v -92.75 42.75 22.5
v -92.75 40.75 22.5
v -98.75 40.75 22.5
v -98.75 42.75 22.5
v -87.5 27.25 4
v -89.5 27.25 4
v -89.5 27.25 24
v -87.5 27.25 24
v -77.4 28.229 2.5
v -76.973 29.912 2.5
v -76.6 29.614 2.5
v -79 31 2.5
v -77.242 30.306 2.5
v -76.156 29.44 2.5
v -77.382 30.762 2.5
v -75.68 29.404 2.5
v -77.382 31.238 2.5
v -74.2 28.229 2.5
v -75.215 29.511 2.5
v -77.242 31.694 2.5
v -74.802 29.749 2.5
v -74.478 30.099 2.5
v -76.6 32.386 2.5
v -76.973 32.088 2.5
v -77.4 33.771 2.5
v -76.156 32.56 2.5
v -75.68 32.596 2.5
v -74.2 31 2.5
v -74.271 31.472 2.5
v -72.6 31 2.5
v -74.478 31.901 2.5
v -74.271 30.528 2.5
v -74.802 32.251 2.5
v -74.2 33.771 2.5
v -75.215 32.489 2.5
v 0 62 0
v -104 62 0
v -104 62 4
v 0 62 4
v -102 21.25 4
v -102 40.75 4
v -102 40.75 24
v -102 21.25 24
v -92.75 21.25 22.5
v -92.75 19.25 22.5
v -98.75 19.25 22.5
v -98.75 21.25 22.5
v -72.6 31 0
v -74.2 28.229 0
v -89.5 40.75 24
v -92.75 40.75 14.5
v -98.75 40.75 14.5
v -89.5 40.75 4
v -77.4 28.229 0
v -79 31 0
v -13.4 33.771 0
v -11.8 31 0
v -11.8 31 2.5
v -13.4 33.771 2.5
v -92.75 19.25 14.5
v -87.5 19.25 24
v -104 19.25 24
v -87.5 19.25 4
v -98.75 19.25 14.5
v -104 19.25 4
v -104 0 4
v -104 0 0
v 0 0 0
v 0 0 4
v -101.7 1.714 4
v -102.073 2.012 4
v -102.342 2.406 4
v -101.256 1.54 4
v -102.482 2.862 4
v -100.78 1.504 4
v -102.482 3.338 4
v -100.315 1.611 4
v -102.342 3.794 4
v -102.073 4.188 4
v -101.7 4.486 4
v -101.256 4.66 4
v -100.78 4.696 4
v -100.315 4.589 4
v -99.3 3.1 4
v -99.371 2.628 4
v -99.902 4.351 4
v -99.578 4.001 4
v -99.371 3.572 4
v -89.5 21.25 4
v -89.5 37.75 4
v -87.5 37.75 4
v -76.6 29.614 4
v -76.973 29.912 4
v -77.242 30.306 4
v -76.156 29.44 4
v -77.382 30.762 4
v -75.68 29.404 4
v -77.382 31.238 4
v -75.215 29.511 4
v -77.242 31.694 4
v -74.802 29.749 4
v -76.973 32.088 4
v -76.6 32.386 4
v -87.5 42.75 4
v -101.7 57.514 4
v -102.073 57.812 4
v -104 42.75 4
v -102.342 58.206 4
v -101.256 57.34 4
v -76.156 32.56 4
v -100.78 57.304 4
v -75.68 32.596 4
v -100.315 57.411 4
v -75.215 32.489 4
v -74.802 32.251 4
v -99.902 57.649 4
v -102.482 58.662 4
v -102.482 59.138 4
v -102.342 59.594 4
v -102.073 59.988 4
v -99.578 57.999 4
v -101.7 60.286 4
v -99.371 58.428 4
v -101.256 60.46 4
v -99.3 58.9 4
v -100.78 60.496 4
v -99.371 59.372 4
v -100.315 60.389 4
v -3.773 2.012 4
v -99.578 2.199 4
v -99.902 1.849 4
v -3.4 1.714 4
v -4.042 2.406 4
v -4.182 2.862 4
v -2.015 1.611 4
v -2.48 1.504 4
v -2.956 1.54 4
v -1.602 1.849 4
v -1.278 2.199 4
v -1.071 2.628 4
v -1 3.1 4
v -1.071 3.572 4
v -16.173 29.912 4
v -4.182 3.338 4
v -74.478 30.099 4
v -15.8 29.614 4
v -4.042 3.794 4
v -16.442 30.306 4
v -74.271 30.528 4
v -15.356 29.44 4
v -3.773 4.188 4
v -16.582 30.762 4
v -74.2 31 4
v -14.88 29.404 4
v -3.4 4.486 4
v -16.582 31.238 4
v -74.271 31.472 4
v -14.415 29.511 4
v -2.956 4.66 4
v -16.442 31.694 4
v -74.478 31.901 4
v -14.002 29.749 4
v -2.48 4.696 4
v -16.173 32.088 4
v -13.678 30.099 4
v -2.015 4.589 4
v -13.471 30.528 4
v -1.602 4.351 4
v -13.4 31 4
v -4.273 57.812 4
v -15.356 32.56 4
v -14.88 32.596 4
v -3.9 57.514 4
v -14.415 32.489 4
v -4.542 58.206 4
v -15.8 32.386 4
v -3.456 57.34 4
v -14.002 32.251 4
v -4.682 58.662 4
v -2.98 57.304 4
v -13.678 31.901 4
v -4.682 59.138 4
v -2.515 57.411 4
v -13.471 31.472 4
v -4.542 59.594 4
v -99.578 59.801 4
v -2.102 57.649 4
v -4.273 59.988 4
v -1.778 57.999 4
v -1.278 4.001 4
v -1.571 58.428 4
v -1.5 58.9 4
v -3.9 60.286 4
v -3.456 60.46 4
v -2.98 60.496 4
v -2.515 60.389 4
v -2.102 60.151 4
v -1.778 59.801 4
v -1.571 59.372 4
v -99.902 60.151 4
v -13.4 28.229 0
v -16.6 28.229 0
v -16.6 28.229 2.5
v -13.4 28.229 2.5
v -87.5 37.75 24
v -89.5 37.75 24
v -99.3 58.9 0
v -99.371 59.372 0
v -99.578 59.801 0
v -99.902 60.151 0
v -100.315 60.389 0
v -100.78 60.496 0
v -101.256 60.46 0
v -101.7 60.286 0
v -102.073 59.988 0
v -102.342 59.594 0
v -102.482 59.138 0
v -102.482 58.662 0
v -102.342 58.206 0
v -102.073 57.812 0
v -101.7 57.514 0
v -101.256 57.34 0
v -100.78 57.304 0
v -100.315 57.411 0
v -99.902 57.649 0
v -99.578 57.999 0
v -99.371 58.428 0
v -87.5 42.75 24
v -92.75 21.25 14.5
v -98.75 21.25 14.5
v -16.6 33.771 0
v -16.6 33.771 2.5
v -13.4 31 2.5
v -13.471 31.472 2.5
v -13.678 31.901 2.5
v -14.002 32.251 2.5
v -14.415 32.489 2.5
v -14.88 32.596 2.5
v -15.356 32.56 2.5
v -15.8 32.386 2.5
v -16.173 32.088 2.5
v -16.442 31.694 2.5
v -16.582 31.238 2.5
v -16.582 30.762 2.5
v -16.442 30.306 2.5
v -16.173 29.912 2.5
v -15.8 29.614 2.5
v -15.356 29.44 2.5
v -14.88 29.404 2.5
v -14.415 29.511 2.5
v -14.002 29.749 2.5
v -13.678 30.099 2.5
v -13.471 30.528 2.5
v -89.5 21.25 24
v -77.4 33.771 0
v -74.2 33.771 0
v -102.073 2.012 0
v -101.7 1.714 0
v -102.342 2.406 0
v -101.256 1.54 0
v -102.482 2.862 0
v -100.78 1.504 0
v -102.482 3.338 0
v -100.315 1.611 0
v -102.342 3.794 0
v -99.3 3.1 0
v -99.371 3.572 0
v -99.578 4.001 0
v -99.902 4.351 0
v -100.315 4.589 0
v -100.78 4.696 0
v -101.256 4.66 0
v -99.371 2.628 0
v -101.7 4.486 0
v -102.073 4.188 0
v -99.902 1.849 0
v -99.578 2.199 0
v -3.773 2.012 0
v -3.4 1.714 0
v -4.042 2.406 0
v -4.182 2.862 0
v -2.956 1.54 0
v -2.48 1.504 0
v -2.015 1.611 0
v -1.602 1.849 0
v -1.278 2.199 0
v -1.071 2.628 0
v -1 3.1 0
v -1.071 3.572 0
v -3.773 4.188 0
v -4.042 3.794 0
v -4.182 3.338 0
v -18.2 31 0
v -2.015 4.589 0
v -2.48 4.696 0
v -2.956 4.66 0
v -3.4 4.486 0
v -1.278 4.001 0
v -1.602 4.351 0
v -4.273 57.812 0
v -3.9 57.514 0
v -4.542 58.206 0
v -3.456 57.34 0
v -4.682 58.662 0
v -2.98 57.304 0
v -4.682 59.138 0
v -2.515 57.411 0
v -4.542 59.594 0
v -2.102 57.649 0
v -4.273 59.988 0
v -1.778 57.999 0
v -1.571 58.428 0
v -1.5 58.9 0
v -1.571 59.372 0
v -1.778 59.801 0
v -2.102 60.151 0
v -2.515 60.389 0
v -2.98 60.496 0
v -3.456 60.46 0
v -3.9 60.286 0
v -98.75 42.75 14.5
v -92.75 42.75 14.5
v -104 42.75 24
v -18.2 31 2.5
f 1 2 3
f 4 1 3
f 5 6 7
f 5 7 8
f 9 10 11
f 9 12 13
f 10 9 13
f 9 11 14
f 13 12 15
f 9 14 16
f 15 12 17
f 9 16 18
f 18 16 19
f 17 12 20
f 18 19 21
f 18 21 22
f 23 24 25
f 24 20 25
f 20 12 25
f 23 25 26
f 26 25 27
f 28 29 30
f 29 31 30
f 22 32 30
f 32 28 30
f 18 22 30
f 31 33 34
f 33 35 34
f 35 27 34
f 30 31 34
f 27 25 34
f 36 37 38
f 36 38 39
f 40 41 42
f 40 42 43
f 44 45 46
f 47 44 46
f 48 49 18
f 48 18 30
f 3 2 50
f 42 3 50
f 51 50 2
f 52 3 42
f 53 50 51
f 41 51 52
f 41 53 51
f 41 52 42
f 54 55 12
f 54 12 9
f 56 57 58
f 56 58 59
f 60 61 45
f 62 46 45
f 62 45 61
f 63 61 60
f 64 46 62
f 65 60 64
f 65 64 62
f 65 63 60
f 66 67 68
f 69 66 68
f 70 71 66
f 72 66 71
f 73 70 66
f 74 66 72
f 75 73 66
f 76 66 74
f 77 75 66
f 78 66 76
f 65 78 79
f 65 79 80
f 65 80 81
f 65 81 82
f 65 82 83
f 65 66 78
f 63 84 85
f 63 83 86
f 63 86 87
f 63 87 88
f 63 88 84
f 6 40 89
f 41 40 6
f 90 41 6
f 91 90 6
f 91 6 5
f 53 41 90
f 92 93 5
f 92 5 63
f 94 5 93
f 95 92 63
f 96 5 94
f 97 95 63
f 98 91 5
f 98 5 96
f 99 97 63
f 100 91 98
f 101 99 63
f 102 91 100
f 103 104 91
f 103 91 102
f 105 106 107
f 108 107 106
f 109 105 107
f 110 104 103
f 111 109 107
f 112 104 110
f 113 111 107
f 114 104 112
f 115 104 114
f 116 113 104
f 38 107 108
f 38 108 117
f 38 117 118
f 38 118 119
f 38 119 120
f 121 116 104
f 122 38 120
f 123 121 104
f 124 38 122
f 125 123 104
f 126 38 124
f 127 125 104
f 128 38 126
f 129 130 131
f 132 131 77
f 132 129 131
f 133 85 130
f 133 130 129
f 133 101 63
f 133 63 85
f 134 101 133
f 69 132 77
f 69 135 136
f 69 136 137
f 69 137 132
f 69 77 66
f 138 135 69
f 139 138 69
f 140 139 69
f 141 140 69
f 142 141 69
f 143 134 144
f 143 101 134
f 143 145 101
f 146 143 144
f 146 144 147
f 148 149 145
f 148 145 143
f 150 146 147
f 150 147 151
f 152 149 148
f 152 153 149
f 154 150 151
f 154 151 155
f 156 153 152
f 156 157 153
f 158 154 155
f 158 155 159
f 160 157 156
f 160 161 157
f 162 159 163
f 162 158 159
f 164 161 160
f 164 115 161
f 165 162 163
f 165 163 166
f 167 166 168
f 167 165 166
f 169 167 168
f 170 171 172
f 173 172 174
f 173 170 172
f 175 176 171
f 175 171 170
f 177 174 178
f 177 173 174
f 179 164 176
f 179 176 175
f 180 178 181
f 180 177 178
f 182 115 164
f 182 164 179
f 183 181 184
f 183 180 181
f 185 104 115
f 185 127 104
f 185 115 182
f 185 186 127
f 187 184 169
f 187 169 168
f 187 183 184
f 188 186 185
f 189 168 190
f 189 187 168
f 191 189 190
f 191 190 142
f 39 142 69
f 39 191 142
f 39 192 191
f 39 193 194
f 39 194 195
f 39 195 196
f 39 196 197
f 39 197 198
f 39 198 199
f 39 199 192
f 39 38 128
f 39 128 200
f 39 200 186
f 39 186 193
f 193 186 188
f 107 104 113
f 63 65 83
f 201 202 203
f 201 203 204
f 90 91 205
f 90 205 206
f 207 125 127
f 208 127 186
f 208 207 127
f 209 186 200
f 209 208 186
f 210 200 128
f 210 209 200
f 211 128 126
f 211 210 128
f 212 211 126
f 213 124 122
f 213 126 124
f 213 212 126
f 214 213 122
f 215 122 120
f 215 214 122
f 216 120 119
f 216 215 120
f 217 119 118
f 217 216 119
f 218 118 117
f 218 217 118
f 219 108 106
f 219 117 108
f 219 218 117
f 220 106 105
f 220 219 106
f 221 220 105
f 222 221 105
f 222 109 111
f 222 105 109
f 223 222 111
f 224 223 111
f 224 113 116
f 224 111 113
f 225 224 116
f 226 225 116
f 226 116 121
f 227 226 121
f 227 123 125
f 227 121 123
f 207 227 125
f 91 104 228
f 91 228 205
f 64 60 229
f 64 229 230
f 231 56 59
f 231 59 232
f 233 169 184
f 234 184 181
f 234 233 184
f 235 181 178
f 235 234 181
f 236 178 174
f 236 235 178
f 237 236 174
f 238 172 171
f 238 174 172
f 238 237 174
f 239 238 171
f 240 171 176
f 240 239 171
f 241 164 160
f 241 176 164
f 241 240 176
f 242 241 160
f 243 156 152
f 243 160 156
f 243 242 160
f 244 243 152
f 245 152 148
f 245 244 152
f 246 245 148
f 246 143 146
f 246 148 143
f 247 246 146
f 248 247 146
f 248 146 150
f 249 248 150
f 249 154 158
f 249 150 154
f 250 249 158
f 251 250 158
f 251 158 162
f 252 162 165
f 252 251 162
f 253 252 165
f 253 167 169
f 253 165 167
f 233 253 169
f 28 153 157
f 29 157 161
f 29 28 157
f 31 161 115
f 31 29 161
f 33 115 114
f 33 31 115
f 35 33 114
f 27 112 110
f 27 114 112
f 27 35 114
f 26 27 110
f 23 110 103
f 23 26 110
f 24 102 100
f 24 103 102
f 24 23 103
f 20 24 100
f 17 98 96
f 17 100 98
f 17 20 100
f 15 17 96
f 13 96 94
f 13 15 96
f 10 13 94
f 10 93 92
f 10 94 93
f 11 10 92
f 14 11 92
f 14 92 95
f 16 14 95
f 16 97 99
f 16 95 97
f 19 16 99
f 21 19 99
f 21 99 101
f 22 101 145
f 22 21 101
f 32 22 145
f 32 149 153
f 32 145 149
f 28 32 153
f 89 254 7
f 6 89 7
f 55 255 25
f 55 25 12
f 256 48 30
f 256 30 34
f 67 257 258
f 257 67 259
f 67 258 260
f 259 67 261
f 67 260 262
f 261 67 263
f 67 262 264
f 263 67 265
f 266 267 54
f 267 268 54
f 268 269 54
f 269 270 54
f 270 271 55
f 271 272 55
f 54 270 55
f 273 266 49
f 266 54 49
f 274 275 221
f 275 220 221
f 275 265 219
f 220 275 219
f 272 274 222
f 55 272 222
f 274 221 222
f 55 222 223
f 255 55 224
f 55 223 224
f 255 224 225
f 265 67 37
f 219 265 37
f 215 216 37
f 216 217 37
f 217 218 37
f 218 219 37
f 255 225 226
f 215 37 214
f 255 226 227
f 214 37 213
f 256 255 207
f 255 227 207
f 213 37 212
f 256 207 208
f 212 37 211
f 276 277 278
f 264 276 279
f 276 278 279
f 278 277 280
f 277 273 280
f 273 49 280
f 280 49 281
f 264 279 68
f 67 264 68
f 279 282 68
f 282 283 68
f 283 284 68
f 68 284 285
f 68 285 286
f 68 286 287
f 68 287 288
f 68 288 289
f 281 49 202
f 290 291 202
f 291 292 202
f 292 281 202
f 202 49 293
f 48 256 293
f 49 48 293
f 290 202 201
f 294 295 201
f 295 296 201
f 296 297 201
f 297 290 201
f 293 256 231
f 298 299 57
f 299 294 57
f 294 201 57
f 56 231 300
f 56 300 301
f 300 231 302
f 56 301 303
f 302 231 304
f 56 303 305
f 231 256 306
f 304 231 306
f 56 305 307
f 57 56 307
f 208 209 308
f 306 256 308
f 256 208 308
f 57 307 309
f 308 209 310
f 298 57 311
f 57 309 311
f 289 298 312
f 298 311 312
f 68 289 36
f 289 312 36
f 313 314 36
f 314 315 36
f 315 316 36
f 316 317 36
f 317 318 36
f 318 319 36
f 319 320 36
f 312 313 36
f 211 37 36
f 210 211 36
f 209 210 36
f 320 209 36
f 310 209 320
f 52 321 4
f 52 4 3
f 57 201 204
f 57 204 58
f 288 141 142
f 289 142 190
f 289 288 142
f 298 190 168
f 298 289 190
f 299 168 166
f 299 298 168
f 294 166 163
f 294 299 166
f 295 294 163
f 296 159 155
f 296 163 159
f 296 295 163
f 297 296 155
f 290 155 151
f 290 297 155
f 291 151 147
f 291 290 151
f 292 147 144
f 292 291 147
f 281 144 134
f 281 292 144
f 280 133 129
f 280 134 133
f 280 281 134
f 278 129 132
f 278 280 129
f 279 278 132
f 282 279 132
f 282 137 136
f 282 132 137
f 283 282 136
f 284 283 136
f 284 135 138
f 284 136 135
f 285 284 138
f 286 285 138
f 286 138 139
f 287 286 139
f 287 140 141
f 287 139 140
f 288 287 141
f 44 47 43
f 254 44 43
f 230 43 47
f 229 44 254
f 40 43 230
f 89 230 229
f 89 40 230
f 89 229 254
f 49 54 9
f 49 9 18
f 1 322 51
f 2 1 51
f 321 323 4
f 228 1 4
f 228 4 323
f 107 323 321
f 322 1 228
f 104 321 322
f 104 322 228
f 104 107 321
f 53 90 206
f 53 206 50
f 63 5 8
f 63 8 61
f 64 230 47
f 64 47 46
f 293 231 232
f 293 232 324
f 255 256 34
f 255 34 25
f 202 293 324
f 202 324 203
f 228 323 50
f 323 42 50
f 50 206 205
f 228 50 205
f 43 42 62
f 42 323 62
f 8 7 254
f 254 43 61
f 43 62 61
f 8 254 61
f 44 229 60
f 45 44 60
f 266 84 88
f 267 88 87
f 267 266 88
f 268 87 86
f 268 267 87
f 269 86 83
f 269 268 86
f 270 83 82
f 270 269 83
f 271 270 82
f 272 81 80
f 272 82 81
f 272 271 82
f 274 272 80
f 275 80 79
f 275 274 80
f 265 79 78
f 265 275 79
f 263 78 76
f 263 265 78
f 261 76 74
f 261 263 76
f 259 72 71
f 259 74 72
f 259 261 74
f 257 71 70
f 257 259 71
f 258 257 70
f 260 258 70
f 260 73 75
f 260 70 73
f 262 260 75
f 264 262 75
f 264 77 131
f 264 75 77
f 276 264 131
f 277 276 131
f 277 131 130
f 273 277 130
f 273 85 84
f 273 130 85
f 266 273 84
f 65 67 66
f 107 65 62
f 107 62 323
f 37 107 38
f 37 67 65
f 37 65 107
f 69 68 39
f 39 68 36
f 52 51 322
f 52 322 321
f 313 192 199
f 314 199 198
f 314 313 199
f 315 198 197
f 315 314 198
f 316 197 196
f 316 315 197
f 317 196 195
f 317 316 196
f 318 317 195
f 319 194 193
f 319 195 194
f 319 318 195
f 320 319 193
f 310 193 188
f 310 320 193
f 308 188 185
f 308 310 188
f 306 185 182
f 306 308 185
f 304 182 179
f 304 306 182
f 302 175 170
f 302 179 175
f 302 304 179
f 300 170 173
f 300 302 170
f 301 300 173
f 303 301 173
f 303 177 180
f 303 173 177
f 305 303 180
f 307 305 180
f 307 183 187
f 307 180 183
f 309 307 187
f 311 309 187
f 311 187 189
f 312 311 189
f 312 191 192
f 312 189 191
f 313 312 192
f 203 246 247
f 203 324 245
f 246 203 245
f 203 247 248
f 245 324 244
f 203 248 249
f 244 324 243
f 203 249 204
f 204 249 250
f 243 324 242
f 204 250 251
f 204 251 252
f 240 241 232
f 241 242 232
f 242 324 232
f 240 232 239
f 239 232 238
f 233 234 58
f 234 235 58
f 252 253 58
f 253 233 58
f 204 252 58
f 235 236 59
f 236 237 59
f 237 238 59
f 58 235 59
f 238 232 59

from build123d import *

# Parameters (mm, degrees)
BOX_W                  = 6
BOX_H                  = 30
BOX_DEPTH              = 8
EXTRUDE001_DEPTH       = 20
CUT009_PLACEMENT_ANGLE = 180
SKETCH003_R            = 1.6
EXTRUDE003_DEPTH       = 2.5
SKETCH002_R            = 1.6
EXTRUDE002_DEPTH       = 2.5
SKETCH_R               = 1.6
EXTRUDE_DEPTH          = 10
CYLINDER007_R          = 1.6
CYLINDER007_DEPTH      = 10
CYLINDER006_R          = 1.6
CYLINDER006_DEPTH      = 10
CYLINDER005_R          = 1.6
CYLINDER005_DEPTH      = 10
CYLINDER004_R          = 1.6
CYLINDER004_DEPTH      = 10
BOX001_W               = 104
BOX001_H               = 62
BOX001_DEPTH           = 4


with BuildPart() as cube:
    # Box → Box (new body)
    with BuildSketch(Plane(origin=(-3, -15, 10.5), x_dir=(1, 0, 0), z_dir=(0, 0, 1))):
        with Locations((3, 15)):
            Rectangle(BOX_W, BOX_H)
    extrude(amount=BOX_DEPTH)


with BuildPart() as switch_holder:
    # Sketch001 → Extrude001 (new body)
    with BuildSketch(Plane.XY):
        Polygon((6.25, -9.75), (6.25, 9.75), (-6.25, 9.75), (-6.25, 3.75), (-8.25, 3.75), (-8.25, 11.75), (8.25, 11.75), (8.25, -11.75), (-8.25, -11.75), (-8.25, -6.75), (-6.25, -6.75), (-6.25, -9.75), align=None)
    extrude(amount=EXTRUDE001_DEPTH)

    # Cut009: cut Cube
    add(cube.part, mode=Mode.SUBTRACT)


with BuildPart() as switch_holder_1:
    # Cut009 placement: moved
    add(switch_holder.part.moved(Location((-95.75, 31, 4))).rotate(Axis((-95.75, 31, 4), (0, 0, 1)), CUT009_PLACEMENT_ANGLE))


with BuildPart() as nylon_nut_cutout001:
    # Sketch003 → Extrude003 (new body)
    with BuildSketch(Plane.XY):
        Polygon((3.2, 0), (1.6, 2.771281), (-1.6, 2.771281), (-3.2, 0), (-1.6, -2.771281), (1.6, -2.771281), align=None)
        Circle(SKETCH003_R, mode=Mode.SUBTRACT)
    extrude(amount=EXTRUDE003_DEPTH)


with BuildPart() as nylon_nut_cutout001_1:
    # Extrude003 placement: moved
    add(nylon_nut_cutout001.part.moved(Location((-75.8, 31, 0))))


with BuildPart() as nylon_nut_cutout:
    # Sketch002 → Extrude002 (new body)
    with BuildSketch(Plane.XY):
        Polygon((3.2, 0), (1.6, 2.771281), (-1.6, 2.771281), (-3.2, 0), (-1.6, -2.771281), (1.6, -2.771281), align=None)
        Circle(SKETCH002_R, mode=Mode.SUBTRACT)
    extrude(amount=EXTRUDE002_DEPTH)


with BuildPart() as nylon_nut_cutout_1:
    # Extrude002 placement: moved
    add(nylon_nut_cutout.part.moved(Location((-15, 31, 0))))


with BuildPart() as extrude_body:
    # Sketch → Extrude (new body)
    with BuildSketch(Plane.XY):
        with Locations((-15, 31)):
            Circle(SKETCH_R)
        with Locations((-75.8, 31)):
            Circle(SKETCH_R)
    extrude(amount=EXTRUDE_DEPTH)


with BuildPart() as mount_point003:
    # Cylinder007 → Cylinder007 (new body)
    with BuildSketch(Plane(origin=(-3.1, 58.9, 0), x_dir=(1, 0, 0), z_dir=(0, 0, 1))):
        Circle(CYLINDER007_R)
    extrude(amount=CYLINDER007_DEPTH)


with BuildPart() as mount_point002:
    # Cylinder006 → Cylinder006 (new body)
    with BuildSketch(Plane(origin=(-100.9, 58.9, 0), x_dir=(1, 0, 0), z_dir=(0, 0, 1))):
        Circle(CYLINDER006_R)
    extrude(amount=CYLINDER006_DEPTH)


with BuildPart() as mount_point001:
    # Cylinder005 → Cylinder005 (new body)
    with BuildSketch(Plane(origin=(-100.9, 3.1, 0), x_dir=(1, 0, 0), z_dir=(0, 0, 1))):
        Circle(CYLINDER005_R)
    extrude(amount=CYLINDER005_DEPTH)


with BuildPart() as mount_point:
    # Cylinder004 → Cylinder004 (new body)
    with BuildSketch(Plane(origin=(-2.6, 3.1, 0), x_dir=(1, 0, 0), z_dir=(0, 0, 1))):
        Circle(CYLINDER004_R)
    extrude(amount=CYLINDER004_DEPTH)


with BuildPart() as battery_platform:
    # Box001 → Box001 (new body)
    with BuildSketch(Plane(origin=(-104, 0, 0), x_dir=(1, 0, 0), z_dir=(0, 0, 1))):
        with Locations((52, 31)):
            Rectangle(BOX001_W, BOX001_H)
    extrude(amount=BOX001_DEPTH)

    # Cut005: cut Mount Point
    add(mount_point.part, mode=Mode.SUBTRACT)

    # Cut006: cut Mount Point001
    add(mount_point001.part, mode=Mode.SUBTRACT)

    # Cut007: cut Mount Point002
    add(mount_point002.part, mode=Mode.SUBTRACT)

    # Cut008: cut Mount Point003
    add(mount_point003.part, mode=Mode.SUBTRACT)

    # Cut: cut Extrude body
    add(extrude_body.part, mode=Mode.SUBTRACT)

    # Cut010: cut Nylon Nut Cutout
    add(nylon_nut_cutout_1.part, mode=Mode.SUBTRACT)

    # Cut011: cut Nylon Nut Cutout001
    add(nylon_nut_cutout001_1.part, mode=Mode.SUBTRACT)

    # Fusion: union Switch Holder
    add(switch_holder_1.part)


solid = battery_platform.part
